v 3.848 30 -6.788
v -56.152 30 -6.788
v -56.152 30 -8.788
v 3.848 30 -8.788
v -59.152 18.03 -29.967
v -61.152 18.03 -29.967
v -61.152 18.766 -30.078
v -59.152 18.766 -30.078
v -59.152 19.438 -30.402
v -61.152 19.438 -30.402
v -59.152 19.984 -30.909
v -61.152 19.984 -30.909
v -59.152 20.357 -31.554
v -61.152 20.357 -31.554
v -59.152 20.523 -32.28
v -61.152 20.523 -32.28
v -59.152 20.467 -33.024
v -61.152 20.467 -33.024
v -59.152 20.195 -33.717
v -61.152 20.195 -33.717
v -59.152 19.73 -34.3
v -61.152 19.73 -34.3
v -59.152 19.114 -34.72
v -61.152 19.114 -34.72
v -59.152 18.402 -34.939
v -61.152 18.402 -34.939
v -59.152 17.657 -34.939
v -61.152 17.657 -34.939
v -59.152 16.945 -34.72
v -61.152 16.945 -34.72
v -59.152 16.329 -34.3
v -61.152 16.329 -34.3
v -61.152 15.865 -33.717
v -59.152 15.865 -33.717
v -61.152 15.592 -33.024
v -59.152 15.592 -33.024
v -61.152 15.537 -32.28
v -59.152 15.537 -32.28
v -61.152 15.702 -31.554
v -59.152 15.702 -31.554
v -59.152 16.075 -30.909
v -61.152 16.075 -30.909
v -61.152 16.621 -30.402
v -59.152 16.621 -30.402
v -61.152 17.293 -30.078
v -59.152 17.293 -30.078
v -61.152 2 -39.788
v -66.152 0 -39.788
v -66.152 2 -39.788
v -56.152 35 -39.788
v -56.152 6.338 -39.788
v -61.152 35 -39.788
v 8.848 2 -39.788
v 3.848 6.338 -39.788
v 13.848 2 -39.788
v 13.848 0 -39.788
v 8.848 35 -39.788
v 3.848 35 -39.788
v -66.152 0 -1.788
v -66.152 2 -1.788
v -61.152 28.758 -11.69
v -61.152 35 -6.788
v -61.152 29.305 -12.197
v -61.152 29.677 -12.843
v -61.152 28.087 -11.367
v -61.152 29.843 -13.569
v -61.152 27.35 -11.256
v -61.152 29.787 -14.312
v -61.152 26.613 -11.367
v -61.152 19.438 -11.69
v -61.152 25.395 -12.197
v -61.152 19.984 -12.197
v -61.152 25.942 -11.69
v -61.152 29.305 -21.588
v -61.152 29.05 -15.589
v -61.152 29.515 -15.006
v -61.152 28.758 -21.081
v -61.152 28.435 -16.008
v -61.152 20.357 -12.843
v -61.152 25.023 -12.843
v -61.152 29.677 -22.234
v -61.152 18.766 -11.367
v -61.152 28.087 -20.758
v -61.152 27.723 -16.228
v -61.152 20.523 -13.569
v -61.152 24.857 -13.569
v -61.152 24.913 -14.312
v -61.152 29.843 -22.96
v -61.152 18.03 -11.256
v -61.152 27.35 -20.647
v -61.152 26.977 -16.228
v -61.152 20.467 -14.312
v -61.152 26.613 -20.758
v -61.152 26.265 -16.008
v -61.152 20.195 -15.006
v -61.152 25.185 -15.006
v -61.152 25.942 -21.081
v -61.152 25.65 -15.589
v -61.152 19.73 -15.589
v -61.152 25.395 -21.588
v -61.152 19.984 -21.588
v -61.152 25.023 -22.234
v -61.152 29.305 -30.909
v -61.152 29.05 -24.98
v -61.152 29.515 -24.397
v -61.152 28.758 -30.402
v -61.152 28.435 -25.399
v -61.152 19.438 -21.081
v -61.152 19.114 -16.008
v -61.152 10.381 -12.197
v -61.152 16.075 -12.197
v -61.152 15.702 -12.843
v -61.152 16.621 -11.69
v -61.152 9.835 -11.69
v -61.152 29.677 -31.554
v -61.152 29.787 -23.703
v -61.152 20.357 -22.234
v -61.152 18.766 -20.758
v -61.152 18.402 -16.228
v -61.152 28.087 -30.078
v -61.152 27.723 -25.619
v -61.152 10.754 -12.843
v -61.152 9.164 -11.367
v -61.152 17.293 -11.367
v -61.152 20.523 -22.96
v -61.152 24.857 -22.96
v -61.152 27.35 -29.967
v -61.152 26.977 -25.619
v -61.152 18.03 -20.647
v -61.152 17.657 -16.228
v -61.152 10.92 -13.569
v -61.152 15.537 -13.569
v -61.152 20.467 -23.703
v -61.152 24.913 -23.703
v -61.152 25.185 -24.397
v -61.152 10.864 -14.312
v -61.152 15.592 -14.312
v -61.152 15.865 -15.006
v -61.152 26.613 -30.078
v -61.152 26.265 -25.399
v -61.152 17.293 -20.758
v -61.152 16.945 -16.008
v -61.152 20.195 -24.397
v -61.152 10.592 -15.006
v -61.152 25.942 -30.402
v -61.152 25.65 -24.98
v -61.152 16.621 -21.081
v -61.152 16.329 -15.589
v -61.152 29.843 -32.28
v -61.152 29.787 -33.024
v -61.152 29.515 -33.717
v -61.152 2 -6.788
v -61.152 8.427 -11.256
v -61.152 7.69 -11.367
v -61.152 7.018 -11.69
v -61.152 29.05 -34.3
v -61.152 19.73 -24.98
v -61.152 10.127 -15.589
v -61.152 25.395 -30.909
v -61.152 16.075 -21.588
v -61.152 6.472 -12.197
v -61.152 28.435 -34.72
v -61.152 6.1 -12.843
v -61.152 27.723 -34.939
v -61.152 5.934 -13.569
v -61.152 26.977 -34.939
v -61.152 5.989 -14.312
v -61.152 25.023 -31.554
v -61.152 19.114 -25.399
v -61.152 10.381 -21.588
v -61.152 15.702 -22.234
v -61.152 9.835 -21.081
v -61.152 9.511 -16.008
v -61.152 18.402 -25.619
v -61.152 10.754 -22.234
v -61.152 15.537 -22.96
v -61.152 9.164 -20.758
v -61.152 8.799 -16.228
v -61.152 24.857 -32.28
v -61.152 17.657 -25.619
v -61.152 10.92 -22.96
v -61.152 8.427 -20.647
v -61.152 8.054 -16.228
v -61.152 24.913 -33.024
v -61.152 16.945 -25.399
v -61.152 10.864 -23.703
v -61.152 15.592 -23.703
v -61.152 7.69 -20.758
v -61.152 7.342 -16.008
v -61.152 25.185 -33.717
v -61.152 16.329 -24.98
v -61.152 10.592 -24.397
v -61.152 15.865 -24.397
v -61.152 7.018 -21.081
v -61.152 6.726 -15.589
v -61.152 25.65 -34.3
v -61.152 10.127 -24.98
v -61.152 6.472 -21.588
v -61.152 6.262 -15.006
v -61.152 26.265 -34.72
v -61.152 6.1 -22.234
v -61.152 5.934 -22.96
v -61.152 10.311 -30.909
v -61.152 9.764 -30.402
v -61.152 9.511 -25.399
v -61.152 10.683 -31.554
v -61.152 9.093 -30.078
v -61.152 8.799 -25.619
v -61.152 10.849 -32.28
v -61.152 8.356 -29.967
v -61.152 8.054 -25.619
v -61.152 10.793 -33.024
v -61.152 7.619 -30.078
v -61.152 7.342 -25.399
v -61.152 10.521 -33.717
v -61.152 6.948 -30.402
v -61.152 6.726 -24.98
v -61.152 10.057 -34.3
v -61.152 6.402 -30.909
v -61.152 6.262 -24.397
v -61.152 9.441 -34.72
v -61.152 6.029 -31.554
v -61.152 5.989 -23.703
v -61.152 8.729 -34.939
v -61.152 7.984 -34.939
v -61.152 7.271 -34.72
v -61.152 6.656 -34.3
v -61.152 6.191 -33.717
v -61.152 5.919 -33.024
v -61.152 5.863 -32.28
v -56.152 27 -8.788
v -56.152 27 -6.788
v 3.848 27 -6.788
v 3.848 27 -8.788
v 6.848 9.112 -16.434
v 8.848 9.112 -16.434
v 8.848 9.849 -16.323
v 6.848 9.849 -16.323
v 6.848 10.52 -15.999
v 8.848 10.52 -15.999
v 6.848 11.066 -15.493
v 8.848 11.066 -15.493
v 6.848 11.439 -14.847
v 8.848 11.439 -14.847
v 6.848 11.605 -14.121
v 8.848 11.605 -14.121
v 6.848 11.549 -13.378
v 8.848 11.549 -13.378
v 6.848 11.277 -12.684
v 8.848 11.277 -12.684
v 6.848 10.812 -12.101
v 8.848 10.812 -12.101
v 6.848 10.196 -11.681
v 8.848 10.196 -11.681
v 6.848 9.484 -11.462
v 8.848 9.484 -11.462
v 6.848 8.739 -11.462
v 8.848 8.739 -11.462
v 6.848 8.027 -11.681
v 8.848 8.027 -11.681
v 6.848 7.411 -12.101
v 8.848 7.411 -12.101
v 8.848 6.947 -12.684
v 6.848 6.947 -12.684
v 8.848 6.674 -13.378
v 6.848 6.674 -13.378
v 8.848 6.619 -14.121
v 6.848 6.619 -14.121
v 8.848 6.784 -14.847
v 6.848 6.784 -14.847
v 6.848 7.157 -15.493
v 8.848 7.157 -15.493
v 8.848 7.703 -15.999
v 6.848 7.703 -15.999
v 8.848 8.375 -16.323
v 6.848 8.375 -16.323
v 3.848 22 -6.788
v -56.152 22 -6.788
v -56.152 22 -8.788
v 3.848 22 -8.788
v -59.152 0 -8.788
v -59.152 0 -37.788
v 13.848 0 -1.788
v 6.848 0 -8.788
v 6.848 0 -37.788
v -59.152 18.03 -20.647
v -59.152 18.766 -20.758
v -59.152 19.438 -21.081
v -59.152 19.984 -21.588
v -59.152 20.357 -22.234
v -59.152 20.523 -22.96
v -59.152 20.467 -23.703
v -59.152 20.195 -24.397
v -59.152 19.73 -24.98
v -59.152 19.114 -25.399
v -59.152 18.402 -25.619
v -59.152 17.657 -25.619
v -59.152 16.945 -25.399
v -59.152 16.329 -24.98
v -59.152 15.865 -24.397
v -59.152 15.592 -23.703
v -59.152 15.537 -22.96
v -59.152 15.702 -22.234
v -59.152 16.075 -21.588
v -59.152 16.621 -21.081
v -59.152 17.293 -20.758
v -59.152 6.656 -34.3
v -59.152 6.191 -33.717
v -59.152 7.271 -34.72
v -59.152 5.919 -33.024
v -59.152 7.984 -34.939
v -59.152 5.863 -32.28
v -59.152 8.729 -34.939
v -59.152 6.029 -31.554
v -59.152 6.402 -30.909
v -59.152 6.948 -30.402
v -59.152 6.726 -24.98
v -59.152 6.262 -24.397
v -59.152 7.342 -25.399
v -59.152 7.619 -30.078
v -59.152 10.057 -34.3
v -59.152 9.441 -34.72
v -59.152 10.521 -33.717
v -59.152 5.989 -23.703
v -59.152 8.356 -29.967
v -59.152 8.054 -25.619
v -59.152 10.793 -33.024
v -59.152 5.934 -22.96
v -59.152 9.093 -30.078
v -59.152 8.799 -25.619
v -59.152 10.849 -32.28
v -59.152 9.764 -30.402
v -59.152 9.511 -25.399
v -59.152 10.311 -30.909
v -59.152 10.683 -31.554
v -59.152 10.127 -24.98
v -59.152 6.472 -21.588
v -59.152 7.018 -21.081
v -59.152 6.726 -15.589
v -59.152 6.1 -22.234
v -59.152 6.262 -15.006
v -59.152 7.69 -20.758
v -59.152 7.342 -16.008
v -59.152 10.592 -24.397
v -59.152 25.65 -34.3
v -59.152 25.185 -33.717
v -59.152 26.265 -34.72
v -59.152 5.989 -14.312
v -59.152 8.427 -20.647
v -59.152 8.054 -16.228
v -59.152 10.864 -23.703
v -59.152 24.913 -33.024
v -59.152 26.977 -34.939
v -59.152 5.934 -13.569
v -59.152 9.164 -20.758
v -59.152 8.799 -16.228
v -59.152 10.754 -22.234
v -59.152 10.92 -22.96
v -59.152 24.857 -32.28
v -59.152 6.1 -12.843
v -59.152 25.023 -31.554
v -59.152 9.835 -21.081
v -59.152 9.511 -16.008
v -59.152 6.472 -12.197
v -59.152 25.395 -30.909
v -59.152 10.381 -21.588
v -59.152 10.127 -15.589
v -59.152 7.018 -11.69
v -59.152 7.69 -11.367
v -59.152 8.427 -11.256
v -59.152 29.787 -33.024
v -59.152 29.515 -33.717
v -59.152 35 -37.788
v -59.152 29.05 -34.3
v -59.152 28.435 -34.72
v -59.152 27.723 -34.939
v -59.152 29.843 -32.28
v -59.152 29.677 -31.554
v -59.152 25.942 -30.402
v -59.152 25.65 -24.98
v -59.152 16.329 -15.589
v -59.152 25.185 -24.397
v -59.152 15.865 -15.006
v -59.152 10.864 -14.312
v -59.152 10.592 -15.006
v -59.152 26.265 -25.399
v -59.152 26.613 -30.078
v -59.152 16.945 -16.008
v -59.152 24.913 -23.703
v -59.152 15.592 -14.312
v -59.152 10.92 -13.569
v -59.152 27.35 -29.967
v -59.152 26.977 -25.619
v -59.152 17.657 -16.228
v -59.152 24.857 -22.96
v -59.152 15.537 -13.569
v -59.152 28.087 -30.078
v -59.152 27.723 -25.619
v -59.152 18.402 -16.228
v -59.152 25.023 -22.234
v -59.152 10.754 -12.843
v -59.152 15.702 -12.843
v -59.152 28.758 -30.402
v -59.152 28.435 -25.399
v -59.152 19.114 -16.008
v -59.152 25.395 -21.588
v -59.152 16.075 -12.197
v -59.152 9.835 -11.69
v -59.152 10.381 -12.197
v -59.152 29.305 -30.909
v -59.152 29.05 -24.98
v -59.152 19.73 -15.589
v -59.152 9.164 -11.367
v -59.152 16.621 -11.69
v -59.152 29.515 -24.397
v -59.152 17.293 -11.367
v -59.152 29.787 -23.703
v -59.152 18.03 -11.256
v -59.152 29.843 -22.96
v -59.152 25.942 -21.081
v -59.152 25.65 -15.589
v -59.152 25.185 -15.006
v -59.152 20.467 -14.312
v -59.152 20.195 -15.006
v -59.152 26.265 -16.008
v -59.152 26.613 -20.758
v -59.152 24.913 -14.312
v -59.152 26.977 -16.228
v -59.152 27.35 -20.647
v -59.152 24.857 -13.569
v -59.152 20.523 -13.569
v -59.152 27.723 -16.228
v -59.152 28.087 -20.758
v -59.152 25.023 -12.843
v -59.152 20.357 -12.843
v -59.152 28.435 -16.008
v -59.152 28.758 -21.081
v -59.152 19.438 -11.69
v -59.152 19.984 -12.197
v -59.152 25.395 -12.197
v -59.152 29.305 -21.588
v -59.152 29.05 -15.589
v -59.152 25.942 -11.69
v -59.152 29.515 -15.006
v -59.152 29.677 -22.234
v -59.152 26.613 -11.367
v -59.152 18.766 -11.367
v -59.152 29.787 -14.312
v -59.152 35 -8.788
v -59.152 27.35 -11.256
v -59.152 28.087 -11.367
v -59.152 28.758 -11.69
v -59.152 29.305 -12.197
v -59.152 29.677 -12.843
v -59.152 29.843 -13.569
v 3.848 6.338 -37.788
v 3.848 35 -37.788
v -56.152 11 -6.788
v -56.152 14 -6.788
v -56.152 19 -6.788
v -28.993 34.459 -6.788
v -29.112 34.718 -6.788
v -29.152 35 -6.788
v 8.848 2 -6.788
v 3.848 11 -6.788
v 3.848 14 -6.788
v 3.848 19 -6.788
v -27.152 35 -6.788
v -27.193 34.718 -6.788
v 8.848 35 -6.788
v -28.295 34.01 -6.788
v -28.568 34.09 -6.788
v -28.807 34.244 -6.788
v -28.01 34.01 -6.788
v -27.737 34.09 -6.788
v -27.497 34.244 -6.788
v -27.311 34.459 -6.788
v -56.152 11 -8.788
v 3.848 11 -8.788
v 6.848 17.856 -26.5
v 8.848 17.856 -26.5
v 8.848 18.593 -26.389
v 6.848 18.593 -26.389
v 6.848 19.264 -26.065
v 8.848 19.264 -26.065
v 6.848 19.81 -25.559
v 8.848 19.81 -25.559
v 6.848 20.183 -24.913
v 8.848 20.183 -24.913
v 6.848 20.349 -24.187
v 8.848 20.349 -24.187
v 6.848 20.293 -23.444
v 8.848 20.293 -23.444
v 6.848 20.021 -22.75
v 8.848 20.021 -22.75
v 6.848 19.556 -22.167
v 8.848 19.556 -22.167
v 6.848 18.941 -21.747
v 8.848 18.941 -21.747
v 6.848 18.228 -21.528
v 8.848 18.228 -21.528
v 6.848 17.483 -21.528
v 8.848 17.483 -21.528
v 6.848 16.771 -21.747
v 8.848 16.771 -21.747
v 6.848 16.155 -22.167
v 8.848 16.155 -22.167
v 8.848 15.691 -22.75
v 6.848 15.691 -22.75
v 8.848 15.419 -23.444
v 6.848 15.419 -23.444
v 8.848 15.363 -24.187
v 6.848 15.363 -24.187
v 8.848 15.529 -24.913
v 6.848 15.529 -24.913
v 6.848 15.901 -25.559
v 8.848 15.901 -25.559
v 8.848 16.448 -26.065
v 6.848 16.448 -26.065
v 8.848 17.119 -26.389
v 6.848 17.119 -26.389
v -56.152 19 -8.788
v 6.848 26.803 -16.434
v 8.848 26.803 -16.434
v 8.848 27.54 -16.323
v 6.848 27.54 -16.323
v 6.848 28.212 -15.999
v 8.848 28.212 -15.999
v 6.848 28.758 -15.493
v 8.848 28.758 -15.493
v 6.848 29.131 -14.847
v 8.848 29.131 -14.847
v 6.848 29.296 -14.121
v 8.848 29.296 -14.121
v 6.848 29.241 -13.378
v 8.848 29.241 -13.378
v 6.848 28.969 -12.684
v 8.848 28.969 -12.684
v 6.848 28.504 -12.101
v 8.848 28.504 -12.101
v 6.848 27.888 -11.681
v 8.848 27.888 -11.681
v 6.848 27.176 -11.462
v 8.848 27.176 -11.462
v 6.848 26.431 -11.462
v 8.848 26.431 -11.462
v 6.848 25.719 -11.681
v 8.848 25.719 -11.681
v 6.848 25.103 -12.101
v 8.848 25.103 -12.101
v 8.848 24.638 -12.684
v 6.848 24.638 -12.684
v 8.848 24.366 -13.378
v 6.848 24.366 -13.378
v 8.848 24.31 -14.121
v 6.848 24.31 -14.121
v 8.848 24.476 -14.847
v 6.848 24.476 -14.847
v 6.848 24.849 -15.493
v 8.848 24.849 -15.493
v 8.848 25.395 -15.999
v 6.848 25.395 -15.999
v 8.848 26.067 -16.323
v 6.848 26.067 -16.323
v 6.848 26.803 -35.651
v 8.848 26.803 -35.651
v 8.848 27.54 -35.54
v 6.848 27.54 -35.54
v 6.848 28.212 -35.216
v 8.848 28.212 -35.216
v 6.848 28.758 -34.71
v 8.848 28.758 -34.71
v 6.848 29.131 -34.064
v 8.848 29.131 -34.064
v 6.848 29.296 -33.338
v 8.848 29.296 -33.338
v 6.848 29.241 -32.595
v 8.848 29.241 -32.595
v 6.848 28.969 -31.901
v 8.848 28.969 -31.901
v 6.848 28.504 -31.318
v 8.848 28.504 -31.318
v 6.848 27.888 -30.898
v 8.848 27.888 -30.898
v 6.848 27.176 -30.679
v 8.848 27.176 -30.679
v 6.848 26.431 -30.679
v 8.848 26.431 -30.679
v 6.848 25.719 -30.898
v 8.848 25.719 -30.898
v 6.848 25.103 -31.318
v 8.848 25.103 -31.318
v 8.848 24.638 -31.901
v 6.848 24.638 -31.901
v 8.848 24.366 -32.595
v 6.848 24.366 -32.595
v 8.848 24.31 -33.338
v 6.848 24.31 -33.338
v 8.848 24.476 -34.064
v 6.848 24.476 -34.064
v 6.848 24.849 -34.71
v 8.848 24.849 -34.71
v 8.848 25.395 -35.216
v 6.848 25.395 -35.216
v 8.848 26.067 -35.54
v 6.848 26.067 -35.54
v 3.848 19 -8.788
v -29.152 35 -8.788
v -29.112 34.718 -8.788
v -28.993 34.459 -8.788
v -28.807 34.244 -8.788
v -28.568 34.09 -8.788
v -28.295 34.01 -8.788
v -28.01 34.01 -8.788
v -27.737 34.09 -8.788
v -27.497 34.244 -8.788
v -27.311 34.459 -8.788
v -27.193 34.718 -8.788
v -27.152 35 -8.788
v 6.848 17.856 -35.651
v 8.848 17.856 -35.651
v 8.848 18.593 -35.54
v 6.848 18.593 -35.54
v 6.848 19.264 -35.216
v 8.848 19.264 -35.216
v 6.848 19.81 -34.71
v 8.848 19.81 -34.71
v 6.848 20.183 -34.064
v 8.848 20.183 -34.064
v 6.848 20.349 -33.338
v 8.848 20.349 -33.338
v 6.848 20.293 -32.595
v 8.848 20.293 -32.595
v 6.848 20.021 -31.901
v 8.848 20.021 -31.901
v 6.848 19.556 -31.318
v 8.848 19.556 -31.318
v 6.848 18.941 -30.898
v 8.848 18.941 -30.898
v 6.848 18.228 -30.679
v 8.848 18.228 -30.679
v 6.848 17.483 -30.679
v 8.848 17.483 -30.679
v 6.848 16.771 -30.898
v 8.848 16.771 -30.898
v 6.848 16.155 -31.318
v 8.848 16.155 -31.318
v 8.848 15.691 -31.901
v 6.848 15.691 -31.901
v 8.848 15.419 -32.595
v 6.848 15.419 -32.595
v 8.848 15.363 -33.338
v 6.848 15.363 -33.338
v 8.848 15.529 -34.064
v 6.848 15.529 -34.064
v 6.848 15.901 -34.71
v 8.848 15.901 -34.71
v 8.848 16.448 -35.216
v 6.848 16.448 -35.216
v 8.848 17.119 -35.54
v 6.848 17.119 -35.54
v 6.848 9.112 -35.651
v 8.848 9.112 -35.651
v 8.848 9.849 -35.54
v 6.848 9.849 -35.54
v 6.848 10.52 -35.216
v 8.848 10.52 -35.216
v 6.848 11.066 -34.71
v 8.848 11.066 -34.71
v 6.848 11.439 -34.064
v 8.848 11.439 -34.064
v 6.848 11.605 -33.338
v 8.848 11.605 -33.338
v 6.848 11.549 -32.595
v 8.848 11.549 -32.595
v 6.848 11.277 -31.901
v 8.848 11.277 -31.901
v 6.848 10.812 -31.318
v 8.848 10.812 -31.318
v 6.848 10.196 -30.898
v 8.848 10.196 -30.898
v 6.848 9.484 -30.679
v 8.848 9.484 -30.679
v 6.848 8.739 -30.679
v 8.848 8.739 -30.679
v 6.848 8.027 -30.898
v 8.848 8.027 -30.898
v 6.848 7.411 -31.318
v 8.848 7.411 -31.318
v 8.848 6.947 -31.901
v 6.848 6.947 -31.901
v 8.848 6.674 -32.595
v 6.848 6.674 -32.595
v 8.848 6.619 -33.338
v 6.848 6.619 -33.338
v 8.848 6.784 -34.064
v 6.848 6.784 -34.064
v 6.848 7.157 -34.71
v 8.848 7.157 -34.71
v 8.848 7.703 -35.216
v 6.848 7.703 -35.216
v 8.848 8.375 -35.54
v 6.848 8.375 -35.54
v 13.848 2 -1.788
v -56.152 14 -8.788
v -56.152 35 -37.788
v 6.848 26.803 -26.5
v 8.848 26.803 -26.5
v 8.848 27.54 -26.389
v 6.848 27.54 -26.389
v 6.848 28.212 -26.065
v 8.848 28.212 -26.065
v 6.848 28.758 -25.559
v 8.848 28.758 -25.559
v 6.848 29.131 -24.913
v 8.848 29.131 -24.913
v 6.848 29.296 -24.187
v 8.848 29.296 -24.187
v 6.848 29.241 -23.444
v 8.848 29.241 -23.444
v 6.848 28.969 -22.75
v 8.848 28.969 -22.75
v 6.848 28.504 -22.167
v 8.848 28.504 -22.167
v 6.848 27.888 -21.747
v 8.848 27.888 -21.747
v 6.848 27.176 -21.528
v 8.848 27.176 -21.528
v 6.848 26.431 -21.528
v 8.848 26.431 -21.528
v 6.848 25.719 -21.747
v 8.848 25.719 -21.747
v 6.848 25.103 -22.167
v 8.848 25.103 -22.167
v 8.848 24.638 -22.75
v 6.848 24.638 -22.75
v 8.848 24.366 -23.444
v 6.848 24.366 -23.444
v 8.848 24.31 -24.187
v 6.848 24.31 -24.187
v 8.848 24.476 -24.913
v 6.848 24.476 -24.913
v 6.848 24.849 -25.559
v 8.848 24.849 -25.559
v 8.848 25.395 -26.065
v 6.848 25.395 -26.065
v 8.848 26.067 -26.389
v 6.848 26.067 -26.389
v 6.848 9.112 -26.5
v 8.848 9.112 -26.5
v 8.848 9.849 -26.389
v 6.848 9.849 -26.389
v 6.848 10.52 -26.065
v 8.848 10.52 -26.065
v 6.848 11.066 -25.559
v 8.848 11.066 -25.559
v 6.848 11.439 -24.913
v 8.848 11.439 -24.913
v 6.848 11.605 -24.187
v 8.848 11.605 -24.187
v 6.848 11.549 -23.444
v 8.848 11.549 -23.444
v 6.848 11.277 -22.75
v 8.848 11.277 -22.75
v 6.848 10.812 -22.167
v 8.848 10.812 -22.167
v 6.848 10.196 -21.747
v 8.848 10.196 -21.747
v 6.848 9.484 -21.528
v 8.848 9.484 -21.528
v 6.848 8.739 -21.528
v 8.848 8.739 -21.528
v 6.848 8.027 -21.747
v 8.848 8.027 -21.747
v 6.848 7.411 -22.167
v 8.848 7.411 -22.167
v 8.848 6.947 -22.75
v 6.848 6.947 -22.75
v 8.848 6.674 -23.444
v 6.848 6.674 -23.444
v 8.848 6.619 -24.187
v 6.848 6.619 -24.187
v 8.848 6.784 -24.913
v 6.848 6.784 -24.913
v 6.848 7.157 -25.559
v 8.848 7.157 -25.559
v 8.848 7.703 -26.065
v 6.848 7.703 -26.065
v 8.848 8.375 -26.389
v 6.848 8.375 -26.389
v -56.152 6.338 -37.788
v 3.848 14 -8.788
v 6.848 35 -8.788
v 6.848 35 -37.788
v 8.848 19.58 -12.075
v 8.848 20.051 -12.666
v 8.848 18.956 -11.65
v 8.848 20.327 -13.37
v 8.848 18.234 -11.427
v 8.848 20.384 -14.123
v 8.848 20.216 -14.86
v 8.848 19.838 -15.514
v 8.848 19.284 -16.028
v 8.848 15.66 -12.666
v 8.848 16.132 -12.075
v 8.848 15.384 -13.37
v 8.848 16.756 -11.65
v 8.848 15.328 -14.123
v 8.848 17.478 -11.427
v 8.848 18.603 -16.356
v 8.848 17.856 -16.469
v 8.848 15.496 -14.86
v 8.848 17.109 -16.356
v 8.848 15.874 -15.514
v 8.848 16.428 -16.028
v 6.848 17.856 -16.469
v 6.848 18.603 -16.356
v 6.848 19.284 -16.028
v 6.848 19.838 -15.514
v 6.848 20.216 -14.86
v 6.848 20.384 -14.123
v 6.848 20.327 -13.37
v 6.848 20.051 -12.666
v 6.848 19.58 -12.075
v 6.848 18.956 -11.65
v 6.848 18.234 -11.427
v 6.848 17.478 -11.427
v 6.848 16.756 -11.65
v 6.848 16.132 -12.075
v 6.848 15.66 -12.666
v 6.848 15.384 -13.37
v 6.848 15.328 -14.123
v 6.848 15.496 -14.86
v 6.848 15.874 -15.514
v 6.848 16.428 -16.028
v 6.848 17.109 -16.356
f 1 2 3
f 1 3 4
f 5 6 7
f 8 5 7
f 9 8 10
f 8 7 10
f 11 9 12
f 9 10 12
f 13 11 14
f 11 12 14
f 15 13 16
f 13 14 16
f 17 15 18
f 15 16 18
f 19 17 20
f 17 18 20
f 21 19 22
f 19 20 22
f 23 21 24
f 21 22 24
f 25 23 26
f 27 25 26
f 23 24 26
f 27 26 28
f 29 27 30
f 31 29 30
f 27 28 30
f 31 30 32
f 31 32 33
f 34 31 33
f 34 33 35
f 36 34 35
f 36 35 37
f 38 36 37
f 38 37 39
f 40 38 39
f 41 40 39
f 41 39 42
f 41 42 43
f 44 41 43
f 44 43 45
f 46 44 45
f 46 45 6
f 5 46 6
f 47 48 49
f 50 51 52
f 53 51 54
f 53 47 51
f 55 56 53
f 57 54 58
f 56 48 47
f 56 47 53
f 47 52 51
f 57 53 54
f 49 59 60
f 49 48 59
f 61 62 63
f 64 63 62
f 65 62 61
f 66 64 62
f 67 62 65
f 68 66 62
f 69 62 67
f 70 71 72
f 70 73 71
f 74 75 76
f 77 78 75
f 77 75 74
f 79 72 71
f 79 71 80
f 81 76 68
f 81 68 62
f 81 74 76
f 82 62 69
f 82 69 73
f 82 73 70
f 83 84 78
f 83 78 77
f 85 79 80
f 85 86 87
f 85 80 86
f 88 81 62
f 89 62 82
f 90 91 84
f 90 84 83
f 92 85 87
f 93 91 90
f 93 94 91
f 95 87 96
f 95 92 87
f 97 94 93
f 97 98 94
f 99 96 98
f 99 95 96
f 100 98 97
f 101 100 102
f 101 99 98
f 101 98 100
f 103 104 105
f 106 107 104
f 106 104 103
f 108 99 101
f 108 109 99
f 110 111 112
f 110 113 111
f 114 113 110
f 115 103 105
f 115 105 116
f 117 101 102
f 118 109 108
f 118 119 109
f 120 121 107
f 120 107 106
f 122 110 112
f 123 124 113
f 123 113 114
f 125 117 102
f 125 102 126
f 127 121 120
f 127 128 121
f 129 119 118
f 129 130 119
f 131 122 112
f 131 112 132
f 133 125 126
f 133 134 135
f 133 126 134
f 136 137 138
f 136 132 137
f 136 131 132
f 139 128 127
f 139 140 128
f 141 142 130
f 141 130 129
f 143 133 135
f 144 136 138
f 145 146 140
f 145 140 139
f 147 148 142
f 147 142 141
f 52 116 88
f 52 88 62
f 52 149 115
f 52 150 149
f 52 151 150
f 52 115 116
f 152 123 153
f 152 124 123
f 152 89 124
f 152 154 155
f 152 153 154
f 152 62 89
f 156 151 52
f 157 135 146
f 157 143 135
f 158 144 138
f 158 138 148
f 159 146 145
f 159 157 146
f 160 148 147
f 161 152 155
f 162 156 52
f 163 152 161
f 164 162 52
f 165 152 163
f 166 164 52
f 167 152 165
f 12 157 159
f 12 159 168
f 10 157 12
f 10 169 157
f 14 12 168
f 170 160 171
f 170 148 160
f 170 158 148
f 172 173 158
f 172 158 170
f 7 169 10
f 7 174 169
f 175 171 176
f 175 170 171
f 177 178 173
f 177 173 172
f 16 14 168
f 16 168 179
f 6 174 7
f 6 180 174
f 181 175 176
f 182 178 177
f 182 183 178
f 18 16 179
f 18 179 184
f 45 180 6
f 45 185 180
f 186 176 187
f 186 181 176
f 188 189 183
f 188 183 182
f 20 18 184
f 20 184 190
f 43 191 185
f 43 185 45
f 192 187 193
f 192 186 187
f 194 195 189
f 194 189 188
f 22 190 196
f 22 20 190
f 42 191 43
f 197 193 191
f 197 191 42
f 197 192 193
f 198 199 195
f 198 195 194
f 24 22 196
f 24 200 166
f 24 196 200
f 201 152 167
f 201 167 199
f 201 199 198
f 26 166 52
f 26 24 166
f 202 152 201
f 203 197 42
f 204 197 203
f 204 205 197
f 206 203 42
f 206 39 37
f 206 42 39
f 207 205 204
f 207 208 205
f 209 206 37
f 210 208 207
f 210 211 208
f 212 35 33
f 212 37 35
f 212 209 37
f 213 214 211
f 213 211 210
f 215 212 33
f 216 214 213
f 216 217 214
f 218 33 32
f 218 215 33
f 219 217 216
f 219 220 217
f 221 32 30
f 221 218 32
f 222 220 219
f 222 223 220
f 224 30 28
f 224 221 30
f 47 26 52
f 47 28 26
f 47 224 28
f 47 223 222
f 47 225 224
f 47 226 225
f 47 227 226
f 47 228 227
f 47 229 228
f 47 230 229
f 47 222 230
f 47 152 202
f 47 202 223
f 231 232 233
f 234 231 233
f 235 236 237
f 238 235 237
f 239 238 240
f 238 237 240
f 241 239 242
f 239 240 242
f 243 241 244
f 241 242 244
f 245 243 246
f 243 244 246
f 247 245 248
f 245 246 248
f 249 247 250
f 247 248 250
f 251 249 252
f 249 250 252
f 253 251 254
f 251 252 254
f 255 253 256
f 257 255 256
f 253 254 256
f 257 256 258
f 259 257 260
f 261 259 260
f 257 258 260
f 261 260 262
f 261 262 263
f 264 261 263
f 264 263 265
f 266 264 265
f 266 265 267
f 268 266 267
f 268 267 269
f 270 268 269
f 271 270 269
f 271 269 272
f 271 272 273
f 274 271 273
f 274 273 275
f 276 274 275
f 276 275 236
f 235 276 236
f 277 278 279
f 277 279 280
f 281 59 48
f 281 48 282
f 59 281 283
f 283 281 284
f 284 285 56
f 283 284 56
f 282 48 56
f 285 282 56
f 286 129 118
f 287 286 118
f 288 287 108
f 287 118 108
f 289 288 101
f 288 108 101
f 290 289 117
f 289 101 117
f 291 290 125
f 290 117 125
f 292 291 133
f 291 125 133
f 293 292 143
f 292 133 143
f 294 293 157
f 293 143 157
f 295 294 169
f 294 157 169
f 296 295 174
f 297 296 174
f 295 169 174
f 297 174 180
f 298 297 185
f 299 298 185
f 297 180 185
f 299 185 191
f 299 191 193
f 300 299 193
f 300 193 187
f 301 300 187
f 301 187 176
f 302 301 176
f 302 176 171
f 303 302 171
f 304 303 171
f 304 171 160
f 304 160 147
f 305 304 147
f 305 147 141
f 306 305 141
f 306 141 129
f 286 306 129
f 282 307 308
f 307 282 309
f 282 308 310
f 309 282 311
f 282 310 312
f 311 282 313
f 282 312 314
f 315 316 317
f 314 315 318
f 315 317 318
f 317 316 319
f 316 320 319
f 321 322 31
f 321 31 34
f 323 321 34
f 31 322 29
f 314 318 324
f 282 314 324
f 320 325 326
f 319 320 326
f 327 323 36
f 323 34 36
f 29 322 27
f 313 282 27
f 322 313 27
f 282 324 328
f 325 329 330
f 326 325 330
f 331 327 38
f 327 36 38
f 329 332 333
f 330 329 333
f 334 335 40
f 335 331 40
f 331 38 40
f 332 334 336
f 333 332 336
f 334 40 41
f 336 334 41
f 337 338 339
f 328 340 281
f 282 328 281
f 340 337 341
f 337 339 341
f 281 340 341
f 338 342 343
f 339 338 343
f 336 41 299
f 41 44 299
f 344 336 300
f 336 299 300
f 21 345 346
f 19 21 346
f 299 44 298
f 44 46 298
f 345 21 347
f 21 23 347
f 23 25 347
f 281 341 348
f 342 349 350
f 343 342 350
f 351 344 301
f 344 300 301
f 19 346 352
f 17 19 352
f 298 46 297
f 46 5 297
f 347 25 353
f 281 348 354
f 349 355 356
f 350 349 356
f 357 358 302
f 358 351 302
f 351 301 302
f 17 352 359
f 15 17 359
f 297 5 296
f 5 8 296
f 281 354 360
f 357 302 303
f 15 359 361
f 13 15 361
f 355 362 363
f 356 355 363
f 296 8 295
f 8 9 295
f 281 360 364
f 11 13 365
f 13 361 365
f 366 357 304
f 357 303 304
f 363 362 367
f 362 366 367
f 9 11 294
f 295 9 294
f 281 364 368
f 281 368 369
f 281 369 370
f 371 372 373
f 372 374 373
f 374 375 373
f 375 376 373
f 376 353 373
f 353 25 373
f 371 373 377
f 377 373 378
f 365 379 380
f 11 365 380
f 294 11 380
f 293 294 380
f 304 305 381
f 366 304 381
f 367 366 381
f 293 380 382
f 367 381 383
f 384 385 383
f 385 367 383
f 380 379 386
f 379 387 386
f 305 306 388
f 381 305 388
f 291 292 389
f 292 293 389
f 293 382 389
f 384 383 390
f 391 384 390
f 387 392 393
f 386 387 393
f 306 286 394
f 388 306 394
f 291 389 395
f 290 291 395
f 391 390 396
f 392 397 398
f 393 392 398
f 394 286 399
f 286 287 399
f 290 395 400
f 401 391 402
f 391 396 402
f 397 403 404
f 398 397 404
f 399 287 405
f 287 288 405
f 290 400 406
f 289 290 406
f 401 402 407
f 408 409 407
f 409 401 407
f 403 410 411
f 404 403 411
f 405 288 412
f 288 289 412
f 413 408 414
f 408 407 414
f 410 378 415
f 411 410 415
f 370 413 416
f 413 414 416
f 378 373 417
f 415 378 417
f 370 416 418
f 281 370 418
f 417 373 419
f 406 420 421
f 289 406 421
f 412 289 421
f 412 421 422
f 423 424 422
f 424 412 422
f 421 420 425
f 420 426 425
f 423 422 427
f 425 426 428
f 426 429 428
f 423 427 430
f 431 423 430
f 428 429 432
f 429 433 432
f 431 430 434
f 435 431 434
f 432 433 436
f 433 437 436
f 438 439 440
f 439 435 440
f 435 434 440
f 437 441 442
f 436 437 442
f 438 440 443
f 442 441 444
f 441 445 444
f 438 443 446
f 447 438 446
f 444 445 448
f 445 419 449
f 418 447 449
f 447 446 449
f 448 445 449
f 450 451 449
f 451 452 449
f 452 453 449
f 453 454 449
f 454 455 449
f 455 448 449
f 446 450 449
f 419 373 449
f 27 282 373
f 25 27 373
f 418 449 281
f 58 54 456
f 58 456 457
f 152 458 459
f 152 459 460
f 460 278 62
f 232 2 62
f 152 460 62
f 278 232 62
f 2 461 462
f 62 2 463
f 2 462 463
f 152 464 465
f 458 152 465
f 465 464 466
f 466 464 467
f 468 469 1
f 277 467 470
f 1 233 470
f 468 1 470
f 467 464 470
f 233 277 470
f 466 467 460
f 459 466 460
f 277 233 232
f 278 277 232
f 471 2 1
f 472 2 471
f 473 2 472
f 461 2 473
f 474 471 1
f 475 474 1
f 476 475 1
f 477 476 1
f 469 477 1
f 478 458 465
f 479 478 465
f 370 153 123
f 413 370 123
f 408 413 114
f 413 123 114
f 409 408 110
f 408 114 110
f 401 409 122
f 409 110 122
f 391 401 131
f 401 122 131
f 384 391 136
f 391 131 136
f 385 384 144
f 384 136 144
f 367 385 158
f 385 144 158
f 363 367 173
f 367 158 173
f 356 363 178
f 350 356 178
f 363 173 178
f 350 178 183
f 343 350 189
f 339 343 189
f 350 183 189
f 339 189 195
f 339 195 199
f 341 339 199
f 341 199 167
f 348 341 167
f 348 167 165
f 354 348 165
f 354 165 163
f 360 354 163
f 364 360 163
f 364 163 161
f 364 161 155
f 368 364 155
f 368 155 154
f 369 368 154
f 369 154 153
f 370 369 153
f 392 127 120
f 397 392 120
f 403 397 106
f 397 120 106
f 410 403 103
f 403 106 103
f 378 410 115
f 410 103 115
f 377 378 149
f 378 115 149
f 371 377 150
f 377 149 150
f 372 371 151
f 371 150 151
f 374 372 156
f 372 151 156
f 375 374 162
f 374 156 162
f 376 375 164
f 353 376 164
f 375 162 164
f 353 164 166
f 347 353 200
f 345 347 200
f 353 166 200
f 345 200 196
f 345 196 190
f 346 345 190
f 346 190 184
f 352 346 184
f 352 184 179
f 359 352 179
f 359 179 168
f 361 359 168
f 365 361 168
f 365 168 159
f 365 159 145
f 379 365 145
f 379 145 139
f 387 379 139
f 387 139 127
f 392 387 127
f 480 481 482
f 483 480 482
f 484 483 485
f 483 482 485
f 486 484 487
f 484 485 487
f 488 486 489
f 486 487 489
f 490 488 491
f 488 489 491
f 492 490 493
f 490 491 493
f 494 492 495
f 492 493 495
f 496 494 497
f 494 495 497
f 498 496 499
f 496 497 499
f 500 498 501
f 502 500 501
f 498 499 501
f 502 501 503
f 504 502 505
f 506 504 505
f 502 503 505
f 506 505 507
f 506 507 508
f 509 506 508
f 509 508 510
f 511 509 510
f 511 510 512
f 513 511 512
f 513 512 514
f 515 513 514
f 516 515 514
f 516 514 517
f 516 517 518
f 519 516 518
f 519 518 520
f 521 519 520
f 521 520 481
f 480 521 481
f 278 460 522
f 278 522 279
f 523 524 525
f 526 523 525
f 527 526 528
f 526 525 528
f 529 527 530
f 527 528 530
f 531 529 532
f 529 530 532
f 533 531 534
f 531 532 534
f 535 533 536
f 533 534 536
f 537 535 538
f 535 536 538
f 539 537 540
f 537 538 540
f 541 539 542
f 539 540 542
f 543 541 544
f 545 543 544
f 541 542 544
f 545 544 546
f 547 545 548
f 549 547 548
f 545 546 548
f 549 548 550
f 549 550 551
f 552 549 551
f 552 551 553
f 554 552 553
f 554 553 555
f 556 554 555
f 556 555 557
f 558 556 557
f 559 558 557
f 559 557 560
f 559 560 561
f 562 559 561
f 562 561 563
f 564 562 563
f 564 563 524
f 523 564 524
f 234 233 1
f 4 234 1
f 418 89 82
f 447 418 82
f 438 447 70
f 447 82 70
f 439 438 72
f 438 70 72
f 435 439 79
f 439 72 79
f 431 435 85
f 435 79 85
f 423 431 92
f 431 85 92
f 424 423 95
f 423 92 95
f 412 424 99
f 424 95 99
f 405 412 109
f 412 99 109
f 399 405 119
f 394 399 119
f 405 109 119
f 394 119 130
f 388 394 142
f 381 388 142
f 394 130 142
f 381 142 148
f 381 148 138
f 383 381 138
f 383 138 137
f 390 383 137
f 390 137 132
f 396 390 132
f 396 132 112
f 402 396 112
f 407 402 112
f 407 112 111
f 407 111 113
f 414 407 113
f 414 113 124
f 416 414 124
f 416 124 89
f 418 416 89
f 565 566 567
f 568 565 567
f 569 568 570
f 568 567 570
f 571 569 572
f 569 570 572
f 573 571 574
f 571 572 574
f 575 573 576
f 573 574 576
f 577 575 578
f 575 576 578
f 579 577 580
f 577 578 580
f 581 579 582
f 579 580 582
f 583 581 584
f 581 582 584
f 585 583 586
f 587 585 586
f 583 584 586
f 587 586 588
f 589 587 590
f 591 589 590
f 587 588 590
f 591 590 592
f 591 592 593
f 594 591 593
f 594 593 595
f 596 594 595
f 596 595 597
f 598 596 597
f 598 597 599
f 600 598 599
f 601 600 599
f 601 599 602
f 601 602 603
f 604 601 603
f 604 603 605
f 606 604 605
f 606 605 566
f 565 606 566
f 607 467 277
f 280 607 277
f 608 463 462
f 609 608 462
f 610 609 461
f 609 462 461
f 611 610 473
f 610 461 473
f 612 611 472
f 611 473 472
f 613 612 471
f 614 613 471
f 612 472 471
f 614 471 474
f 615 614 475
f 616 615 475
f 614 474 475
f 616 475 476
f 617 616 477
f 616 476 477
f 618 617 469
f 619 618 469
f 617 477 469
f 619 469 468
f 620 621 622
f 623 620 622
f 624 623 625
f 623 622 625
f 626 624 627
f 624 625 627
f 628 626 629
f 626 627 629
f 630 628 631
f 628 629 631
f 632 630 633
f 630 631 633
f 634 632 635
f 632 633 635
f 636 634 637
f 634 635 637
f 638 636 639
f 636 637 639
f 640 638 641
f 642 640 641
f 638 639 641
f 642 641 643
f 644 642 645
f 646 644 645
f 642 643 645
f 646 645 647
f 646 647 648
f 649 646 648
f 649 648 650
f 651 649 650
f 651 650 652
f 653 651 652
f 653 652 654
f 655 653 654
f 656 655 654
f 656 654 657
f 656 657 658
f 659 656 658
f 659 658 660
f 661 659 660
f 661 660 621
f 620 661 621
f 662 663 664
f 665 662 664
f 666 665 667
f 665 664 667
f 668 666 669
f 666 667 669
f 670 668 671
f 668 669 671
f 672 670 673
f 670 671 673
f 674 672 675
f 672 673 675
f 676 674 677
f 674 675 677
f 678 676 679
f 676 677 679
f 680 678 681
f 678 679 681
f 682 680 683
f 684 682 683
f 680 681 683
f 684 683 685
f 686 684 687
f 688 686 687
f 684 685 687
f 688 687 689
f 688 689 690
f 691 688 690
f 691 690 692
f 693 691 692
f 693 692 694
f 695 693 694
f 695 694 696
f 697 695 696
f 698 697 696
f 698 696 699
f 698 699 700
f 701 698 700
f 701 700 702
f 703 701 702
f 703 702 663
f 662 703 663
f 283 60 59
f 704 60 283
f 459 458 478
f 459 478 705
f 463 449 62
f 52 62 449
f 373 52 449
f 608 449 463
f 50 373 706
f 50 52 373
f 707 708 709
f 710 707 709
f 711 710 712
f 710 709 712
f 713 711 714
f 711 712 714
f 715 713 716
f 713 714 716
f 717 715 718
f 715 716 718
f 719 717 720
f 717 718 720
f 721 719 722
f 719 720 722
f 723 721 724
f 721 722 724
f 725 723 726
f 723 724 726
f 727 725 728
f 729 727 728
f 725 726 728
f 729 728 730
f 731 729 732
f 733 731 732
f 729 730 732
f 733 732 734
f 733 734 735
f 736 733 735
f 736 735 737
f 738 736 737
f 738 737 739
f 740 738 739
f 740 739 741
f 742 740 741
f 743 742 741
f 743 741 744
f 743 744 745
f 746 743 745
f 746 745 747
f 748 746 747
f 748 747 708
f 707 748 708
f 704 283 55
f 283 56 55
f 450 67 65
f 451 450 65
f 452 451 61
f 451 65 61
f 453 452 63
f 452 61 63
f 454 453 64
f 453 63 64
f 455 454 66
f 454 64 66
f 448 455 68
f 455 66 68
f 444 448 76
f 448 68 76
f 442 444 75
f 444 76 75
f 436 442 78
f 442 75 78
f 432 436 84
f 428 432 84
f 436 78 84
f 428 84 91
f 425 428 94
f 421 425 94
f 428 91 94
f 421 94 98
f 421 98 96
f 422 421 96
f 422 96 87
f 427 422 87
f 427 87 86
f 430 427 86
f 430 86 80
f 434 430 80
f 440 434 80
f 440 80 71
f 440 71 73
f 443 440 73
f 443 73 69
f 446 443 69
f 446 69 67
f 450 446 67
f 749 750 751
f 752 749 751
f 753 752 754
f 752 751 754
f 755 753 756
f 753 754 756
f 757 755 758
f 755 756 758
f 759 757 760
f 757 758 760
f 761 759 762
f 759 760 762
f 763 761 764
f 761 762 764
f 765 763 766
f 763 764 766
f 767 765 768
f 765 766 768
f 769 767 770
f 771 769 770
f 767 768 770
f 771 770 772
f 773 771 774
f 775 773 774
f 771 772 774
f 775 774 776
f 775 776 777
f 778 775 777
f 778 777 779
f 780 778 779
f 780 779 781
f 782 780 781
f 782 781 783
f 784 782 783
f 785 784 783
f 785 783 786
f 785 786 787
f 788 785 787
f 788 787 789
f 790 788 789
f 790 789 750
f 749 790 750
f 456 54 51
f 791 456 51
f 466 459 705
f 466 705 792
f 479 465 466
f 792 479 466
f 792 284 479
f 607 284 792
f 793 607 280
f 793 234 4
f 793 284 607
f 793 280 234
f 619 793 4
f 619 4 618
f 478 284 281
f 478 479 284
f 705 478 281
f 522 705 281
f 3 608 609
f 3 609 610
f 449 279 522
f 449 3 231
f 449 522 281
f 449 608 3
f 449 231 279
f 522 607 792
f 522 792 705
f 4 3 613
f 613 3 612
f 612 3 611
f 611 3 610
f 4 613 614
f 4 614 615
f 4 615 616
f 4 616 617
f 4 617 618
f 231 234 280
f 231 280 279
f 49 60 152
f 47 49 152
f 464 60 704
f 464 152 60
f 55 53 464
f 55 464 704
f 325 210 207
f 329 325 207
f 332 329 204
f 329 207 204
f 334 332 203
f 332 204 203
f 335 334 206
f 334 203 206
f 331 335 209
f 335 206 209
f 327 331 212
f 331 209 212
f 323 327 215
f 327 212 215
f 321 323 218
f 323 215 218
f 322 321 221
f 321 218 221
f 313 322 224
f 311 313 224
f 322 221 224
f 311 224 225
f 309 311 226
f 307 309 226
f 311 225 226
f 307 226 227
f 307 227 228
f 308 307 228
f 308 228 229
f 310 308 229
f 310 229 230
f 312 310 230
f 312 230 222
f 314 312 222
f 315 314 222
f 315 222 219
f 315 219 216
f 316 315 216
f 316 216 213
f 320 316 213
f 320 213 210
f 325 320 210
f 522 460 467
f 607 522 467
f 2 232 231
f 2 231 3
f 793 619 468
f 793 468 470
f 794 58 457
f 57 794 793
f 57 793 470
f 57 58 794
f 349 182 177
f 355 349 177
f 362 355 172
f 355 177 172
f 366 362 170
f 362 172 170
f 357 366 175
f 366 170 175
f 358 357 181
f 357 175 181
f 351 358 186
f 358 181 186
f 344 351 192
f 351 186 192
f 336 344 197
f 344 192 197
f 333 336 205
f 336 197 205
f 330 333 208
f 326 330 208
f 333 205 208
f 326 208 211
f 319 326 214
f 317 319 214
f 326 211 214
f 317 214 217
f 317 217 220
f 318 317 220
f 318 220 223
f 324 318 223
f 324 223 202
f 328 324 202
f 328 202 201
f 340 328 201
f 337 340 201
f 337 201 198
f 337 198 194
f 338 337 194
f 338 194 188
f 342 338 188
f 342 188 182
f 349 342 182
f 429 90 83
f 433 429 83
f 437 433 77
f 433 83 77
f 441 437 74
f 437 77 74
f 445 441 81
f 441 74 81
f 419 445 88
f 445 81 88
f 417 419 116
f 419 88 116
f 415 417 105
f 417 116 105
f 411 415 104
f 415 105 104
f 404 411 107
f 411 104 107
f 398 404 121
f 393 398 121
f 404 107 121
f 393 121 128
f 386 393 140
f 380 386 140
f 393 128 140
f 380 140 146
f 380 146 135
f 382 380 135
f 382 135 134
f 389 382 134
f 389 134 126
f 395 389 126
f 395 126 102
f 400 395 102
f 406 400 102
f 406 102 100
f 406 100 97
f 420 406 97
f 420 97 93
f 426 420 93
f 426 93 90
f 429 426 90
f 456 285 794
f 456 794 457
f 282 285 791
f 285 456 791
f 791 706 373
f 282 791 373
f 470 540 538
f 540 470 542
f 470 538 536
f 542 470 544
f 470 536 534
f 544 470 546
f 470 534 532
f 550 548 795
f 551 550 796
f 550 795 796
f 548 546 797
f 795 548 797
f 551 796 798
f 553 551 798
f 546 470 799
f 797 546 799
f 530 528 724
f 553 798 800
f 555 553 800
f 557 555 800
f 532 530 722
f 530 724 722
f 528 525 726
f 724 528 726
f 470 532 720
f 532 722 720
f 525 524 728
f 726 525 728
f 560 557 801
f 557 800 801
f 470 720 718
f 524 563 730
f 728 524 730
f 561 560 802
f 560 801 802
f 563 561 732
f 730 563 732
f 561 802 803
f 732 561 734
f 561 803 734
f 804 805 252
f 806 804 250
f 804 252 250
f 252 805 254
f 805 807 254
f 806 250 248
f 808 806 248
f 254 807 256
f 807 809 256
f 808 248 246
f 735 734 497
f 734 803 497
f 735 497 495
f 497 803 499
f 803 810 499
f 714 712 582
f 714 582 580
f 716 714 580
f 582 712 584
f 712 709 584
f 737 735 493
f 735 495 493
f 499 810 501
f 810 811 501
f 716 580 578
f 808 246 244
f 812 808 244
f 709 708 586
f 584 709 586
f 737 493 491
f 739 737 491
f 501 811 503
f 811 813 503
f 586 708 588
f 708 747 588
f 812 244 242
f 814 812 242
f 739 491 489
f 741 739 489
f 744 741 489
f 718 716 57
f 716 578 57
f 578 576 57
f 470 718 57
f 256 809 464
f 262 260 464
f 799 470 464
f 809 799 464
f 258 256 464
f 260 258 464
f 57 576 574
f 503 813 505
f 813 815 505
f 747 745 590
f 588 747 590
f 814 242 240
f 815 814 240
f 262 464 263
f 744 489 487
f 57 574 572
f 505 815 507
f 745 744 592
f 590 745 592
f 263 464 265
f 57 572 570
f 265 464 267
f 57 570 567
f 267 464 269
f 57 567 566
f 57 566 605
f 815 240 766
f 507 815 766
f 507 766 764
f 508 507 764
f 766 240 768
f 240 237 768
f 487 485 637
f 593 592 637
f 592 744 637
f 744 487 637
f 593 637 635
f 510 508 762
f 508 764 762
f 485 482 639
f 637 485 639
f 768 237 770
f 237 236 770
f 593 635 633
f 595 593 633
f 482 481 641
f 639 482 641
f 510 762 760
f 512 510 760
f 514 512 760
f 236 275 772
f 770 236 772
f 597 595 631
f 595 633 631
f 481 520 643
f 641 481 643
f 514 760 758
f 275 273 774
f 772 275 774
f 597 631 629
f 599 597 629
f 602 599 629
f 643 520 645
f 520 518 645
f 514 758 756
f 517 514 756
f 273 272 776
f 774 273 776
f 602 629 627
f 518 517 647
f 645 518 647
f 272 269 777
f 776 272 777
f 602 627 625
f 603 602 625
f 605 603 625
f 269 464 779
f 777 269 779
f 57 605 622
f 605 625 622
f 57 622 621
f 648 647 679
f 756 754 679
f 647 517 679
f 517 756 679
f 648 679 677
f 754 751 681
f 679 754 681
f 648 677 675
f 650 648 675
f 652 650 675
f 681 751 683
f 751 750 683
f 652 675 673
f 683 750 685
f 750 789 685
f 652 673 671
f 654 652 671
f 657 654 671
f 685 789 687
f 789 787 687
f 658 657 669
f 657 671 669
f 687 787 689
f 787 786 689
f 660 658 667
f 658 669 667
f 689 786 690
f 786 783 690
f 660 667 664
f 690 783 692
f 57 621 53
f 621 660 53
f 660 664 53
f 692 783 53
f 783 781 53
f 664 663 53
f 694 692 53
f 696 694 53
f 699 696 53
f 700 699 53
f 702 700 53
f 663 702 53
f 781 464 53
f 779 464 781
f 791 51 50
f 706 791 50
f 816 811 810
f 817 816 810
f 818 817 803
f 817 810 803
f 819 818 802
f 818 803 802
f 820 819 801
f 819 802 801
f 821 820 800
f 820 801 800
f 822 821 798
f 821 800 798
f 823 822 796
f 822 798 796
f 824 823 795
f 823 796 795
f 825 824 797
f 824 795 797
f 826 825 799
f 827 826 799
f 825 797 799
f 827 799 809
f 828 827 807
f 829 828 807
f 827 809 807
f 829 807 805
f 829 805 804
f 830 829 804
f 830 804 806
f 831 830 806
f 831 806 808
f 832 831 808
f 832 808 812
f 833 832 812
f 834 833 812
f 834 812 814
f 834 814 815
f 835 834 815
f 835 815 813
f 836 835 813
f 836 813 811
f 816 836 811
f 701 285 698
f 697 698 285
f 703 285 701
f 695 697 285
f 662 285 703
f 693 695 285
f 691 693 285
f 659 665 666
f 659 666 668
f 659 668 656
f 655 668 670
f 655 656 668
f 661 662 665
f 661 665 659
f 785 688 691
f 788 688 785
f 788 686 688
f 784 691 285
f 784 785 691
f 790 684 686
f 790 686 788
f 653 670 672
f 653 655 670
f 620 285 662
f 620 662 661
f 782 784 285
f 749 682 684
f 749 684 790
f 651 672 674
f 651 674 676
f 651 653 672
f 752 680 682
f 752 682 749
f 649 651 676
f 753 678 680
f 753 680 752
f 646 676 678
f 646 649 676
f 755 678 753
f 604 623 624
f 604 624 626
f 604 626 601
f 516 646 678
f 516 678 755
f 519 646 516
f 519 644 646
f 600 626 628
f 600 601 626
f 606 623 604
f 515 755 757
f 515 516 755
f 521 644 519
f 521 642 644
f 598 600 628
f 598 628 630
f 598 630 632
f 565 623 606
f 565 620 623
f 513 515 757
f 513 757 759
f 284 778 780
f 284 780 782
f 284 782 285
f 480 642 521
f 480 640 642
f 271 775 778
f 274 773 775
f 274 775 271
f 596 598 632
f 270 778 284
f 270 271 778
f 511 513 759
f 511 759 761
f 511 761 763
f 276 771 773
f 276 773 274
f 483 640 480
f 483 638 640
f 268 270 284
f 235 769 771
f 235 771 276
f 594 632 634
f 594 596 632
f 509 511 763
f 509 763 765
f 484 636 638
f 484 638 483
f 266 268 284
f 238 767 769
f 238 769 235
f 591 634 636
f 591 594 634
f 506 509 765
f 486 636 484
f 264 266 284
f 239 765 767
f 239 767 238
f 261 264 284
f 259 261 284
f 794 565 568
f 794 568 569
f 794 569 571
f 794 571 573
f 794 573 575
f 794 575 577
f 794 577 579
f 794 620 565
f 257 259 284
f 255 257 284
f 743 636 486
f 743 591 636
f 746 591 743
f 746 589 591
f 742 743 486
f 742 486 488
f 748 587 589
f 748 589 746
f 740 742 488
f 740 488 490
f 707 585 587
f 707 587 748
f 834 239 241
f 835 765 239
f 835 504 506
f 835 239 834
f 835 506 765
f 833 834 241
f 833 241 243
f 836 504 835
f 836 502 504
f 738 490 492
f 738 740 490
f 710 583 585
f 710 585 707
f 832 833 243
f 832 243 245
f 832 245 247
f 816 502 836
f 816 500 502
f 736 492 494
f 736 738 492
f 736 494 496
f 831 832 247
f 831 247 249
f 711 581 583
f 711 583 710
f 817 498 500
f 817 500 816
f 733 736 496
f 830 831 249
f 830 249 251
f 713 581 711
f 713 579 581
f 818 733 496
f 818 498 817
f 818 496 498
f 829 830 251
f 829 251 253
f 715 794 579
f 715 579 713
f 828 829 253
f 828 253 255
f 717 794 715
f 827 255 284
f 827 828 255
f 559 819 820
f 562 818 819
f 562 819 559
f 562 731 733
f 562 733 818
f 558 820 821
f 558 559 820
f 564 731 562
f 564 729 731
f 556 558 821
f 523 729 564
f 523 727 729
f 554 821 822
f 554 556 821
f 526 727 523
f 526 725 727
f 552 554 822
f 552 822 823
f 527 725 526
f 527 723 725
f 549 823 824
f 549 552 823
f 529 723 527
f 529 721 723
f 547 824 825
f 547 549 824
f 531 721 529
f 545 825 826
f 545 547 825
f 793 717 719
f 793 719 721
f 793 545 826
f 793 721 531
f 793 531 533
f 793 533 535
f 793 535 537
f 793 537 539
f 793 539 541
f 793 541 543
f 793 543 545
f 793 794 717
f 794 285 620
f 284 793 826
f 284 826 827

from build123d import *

# Parameters (mm, degrees)
SKETCH1_W           = 70
SKETCH1_H           = 33
BOSS_EXTRUDE1_DEPTH = 35
SKETCH2_W           = 33
SKETCH2_H           = 2
BOSS_EXTRUDE2_DEPTH = 5
SKETCH3_W           = 66
SKETCH3_H           = 29
CUT_EXTRUDE1_DEPTH  = 81.917773835
CUT_EXTRUDE3_DEPTH  = 5
SKETCH13_R          = 2.5
SKETCH13_R_2        = 2.535133393
CUT_EXTRUDE4_DEPTH  = 5
SKETCH14_W          = 33
SKETCH14_H          = 2
BOSS_EXTRUDE4_DEPTH = 5
SKETCH15_R          = 2.5
CUT_EXTRUDE5_DEPTH  = 5
SKETCH17_W          = 80
SKETCH17_H          = 2
BOSS_EXTRUDE6_DEPTH = 5
SKETCH19_W          = 60
SKETCH19_H          = 28.661725901
CUT_EXTRUDE6_DEPTH  = 5
SKETCH20_W          = 60
SKETCH20_H          = 3
CUT_EXTRUDE7_DEPTH  = 5
SKETCH21_W          = 60
SKETCH21_H          = 3
CUT_EXTRUDE8_DEPTH  = 5


with BuildPart() as part:
    # Sketch1 → Boss-Extrude1 (new body)
    with BuildSketch(Plane(origin=(0, 0, 0), x_dir=(1, 0, 0), z_dir=(0, 1, 0))):
        with Locations((-26.152195741, 23.288127357)):
            Rectangle(SKETCH1_W, SKETCH1_H)
    extrude(amount=BOSS_EXTRUDE1_DEPTH)

    # Sketch2 → Boss-Extrude2 (add)
    with BuildSketch(Plane(origin=(8.847804259, 0, 0), x_dir=(0, 0, -1), z_dir=(1, 0, 0))):
        with Locations((23.288127357, 1)):
            Rectangle(SKETCH2_W, SKETCH2_H)
    extrude(amount=BOSS_EXTRUDE2_DEPTH)

    # Sketch3 → Cut-Extrude1 (cut, through all)
    with BuildSketch(Plane(origin=(0, 35, 0), x_dir=(-1, 0, 0), z_dir=(0, 1, 0))):
        with Locations((26.152195741, -23.288127357)):
            Rectangle(SKETCH3_W, SKETCH3_H)
    extrude(amount=-CUT_EXTRUDE1_DEPTH, mode=Mode.SUBTRACT)

    # Sketch9 → Cut-Extrude3 (cut)
    with BuildSketch(Plane.XY.offset(-6.788127357)):
        with BuildLine():
            Line((-27.152195741, 35), (-28.152195741, 35))
            Line((-28.152195741, 35), (-29.152195741, 35))
            ThreePointArc((-29.152195741, 35), (-28.152195741, 34), (-27.152195741, 35))
        make_face()
    extrude(amount=-CUT_EXTRUDE3_DEPTH, mode=Mode.SUBTRACT)

    # Sketch13 → Cut-Extrude4 (cut)
    with BuildSketch(Plane(origin=(8.847804259, 0, 0), x_dir=(0, 0, -1), z_dir=(1, 0, 0))):
        with Locations((13.933834133, 9.111651729)):
            Circle(SKETCH13_R)
        with Locations((13.933834133, 17.855882351)):
            Circle(SKETCH13_R_2)
        with Locations((13.933834133, 26.803467174)):
            Circle(SKETCH13_R)
        with Locations((23.999867059, 26.803467174)):
            Circle(SKETCH13_R)
        with Locations((23.999867059, 17.855882351)):
            Circle(SKETCH13_R)
        with Locations((23.999867059, 9.111651729)):
            Circle(SKETCH13_R)
        with Locations((33.150806082, 9.111651729)):
            Circle(SKETCH13_R)
        with Locations((33.150806082, 17.855882351)):
            Circle(SKETCH13_R)
        with Locations((33.150806082, 26.803467174)):
            Circle(SKETCH13_R)
    extrude(amount=-CUT_EXTRUDE4_DEPTH, mode=Mode.SUBTRACT)

    # Sketch14 → Boss-Extrude4 (add)
    with BuildSketch(Plane.ZY.offset(61.152195741)):
        with Locations((-23.288127357, 1)):
            Rectangle(SKETCH14_W, SKETCH14_H)
    extrude(amount=BOSS_EXTRUDE4_DEPTH)

    # Sketch15 → Cut-Extrude5 (cut)
    with BuildSketch(Plane.ZY.offset(61.152195741)):
        with Locations((-32.467310019, 8.356134386)):
            Circle(SKETCH15_R)
        with Locations((-23.146909162, 8.426743484)):
            Circle(SKETCH15_R)
        with Locations((-13.755899208, 8.426743484)):
            Circle(SKETCH15_R)
        with Locations((-13.755899208, 18.029580731)):
            Circle(SKETCH15_R)
        with Locations((-23.146909162, 18.029580731)):
            Circle(SKETCH15_R)
        with Locations((-32.467310019, 18.029580731)):
            Circle(SKETCH15_R)
        with Locations((-32.467310019, 27.349981588)):
            Circle(SKETCH15_R)
        with Locations((-23.146909162, 27.349981588)):
            Circle(SKETCH15_R)
        with Locations((-13.755899208, 27.349981588)):
            Circle(SKETCH15_R)
    extrude(amount=-CUT_EXTRUDE5_DEPTH, mode=Mode.SUBTRACT)

    # Sketch17 → Boss-Extrude6 (add)
    with BuildSketch(Plane.XY.offset(-6.788127357)):
        with Locations((-26.152195741, 1)):
            Rectangle(SKETCH17_W, SKETCH17_H)
    extrude(amount=BOSS_EXTRUDE6_DEPTH)

    # Sketch19 → Cut-Extrude6 (cut)
    with BuildSketch(Plane(origin=(0, 0, -39.788127357), x_dir=(-1, 0, 0), z_dir=(0, 0, -1))):
        with Locations((26.152195741, 20.66913705)):
            Rectangle(SKETCH19_W, SKETCH19_H)
    extrude(amount=-CUT_EXTRUDE6_DEPTH, mode=Mode.SUBTRACT)

    # Sketch20 → Cut-Extrude7 (cut)
    with BuildSketch(Plane.XY.offset(-6.788127357)):
        with Locations((-26.152195741, 28.5)):
            Rectangle(SKETCH20_W, SKETCH20_H)
    extrude(amount=-CUT_EXTRUDE7_DEPTH, mode=Mode.SUBTRACT)

    # Sketch21 → Cut-Extrude8 (cut)
    with BuildSketch(Plane.XY.offset(-6.788127357)):
        with Locations((-26.152195741, 12.5)):
            Rectangle(SKETCH21_W, SKETCH21_H)
        with Locations((-26.152195741, 20.5)):
            Rectangle(SKETCH21_W, SKETCH21_H)
    extrude(amount=-CUT_EXTRUDE8_DEPTH, mode=Mode.SUBTRACT)


solid = part.part
